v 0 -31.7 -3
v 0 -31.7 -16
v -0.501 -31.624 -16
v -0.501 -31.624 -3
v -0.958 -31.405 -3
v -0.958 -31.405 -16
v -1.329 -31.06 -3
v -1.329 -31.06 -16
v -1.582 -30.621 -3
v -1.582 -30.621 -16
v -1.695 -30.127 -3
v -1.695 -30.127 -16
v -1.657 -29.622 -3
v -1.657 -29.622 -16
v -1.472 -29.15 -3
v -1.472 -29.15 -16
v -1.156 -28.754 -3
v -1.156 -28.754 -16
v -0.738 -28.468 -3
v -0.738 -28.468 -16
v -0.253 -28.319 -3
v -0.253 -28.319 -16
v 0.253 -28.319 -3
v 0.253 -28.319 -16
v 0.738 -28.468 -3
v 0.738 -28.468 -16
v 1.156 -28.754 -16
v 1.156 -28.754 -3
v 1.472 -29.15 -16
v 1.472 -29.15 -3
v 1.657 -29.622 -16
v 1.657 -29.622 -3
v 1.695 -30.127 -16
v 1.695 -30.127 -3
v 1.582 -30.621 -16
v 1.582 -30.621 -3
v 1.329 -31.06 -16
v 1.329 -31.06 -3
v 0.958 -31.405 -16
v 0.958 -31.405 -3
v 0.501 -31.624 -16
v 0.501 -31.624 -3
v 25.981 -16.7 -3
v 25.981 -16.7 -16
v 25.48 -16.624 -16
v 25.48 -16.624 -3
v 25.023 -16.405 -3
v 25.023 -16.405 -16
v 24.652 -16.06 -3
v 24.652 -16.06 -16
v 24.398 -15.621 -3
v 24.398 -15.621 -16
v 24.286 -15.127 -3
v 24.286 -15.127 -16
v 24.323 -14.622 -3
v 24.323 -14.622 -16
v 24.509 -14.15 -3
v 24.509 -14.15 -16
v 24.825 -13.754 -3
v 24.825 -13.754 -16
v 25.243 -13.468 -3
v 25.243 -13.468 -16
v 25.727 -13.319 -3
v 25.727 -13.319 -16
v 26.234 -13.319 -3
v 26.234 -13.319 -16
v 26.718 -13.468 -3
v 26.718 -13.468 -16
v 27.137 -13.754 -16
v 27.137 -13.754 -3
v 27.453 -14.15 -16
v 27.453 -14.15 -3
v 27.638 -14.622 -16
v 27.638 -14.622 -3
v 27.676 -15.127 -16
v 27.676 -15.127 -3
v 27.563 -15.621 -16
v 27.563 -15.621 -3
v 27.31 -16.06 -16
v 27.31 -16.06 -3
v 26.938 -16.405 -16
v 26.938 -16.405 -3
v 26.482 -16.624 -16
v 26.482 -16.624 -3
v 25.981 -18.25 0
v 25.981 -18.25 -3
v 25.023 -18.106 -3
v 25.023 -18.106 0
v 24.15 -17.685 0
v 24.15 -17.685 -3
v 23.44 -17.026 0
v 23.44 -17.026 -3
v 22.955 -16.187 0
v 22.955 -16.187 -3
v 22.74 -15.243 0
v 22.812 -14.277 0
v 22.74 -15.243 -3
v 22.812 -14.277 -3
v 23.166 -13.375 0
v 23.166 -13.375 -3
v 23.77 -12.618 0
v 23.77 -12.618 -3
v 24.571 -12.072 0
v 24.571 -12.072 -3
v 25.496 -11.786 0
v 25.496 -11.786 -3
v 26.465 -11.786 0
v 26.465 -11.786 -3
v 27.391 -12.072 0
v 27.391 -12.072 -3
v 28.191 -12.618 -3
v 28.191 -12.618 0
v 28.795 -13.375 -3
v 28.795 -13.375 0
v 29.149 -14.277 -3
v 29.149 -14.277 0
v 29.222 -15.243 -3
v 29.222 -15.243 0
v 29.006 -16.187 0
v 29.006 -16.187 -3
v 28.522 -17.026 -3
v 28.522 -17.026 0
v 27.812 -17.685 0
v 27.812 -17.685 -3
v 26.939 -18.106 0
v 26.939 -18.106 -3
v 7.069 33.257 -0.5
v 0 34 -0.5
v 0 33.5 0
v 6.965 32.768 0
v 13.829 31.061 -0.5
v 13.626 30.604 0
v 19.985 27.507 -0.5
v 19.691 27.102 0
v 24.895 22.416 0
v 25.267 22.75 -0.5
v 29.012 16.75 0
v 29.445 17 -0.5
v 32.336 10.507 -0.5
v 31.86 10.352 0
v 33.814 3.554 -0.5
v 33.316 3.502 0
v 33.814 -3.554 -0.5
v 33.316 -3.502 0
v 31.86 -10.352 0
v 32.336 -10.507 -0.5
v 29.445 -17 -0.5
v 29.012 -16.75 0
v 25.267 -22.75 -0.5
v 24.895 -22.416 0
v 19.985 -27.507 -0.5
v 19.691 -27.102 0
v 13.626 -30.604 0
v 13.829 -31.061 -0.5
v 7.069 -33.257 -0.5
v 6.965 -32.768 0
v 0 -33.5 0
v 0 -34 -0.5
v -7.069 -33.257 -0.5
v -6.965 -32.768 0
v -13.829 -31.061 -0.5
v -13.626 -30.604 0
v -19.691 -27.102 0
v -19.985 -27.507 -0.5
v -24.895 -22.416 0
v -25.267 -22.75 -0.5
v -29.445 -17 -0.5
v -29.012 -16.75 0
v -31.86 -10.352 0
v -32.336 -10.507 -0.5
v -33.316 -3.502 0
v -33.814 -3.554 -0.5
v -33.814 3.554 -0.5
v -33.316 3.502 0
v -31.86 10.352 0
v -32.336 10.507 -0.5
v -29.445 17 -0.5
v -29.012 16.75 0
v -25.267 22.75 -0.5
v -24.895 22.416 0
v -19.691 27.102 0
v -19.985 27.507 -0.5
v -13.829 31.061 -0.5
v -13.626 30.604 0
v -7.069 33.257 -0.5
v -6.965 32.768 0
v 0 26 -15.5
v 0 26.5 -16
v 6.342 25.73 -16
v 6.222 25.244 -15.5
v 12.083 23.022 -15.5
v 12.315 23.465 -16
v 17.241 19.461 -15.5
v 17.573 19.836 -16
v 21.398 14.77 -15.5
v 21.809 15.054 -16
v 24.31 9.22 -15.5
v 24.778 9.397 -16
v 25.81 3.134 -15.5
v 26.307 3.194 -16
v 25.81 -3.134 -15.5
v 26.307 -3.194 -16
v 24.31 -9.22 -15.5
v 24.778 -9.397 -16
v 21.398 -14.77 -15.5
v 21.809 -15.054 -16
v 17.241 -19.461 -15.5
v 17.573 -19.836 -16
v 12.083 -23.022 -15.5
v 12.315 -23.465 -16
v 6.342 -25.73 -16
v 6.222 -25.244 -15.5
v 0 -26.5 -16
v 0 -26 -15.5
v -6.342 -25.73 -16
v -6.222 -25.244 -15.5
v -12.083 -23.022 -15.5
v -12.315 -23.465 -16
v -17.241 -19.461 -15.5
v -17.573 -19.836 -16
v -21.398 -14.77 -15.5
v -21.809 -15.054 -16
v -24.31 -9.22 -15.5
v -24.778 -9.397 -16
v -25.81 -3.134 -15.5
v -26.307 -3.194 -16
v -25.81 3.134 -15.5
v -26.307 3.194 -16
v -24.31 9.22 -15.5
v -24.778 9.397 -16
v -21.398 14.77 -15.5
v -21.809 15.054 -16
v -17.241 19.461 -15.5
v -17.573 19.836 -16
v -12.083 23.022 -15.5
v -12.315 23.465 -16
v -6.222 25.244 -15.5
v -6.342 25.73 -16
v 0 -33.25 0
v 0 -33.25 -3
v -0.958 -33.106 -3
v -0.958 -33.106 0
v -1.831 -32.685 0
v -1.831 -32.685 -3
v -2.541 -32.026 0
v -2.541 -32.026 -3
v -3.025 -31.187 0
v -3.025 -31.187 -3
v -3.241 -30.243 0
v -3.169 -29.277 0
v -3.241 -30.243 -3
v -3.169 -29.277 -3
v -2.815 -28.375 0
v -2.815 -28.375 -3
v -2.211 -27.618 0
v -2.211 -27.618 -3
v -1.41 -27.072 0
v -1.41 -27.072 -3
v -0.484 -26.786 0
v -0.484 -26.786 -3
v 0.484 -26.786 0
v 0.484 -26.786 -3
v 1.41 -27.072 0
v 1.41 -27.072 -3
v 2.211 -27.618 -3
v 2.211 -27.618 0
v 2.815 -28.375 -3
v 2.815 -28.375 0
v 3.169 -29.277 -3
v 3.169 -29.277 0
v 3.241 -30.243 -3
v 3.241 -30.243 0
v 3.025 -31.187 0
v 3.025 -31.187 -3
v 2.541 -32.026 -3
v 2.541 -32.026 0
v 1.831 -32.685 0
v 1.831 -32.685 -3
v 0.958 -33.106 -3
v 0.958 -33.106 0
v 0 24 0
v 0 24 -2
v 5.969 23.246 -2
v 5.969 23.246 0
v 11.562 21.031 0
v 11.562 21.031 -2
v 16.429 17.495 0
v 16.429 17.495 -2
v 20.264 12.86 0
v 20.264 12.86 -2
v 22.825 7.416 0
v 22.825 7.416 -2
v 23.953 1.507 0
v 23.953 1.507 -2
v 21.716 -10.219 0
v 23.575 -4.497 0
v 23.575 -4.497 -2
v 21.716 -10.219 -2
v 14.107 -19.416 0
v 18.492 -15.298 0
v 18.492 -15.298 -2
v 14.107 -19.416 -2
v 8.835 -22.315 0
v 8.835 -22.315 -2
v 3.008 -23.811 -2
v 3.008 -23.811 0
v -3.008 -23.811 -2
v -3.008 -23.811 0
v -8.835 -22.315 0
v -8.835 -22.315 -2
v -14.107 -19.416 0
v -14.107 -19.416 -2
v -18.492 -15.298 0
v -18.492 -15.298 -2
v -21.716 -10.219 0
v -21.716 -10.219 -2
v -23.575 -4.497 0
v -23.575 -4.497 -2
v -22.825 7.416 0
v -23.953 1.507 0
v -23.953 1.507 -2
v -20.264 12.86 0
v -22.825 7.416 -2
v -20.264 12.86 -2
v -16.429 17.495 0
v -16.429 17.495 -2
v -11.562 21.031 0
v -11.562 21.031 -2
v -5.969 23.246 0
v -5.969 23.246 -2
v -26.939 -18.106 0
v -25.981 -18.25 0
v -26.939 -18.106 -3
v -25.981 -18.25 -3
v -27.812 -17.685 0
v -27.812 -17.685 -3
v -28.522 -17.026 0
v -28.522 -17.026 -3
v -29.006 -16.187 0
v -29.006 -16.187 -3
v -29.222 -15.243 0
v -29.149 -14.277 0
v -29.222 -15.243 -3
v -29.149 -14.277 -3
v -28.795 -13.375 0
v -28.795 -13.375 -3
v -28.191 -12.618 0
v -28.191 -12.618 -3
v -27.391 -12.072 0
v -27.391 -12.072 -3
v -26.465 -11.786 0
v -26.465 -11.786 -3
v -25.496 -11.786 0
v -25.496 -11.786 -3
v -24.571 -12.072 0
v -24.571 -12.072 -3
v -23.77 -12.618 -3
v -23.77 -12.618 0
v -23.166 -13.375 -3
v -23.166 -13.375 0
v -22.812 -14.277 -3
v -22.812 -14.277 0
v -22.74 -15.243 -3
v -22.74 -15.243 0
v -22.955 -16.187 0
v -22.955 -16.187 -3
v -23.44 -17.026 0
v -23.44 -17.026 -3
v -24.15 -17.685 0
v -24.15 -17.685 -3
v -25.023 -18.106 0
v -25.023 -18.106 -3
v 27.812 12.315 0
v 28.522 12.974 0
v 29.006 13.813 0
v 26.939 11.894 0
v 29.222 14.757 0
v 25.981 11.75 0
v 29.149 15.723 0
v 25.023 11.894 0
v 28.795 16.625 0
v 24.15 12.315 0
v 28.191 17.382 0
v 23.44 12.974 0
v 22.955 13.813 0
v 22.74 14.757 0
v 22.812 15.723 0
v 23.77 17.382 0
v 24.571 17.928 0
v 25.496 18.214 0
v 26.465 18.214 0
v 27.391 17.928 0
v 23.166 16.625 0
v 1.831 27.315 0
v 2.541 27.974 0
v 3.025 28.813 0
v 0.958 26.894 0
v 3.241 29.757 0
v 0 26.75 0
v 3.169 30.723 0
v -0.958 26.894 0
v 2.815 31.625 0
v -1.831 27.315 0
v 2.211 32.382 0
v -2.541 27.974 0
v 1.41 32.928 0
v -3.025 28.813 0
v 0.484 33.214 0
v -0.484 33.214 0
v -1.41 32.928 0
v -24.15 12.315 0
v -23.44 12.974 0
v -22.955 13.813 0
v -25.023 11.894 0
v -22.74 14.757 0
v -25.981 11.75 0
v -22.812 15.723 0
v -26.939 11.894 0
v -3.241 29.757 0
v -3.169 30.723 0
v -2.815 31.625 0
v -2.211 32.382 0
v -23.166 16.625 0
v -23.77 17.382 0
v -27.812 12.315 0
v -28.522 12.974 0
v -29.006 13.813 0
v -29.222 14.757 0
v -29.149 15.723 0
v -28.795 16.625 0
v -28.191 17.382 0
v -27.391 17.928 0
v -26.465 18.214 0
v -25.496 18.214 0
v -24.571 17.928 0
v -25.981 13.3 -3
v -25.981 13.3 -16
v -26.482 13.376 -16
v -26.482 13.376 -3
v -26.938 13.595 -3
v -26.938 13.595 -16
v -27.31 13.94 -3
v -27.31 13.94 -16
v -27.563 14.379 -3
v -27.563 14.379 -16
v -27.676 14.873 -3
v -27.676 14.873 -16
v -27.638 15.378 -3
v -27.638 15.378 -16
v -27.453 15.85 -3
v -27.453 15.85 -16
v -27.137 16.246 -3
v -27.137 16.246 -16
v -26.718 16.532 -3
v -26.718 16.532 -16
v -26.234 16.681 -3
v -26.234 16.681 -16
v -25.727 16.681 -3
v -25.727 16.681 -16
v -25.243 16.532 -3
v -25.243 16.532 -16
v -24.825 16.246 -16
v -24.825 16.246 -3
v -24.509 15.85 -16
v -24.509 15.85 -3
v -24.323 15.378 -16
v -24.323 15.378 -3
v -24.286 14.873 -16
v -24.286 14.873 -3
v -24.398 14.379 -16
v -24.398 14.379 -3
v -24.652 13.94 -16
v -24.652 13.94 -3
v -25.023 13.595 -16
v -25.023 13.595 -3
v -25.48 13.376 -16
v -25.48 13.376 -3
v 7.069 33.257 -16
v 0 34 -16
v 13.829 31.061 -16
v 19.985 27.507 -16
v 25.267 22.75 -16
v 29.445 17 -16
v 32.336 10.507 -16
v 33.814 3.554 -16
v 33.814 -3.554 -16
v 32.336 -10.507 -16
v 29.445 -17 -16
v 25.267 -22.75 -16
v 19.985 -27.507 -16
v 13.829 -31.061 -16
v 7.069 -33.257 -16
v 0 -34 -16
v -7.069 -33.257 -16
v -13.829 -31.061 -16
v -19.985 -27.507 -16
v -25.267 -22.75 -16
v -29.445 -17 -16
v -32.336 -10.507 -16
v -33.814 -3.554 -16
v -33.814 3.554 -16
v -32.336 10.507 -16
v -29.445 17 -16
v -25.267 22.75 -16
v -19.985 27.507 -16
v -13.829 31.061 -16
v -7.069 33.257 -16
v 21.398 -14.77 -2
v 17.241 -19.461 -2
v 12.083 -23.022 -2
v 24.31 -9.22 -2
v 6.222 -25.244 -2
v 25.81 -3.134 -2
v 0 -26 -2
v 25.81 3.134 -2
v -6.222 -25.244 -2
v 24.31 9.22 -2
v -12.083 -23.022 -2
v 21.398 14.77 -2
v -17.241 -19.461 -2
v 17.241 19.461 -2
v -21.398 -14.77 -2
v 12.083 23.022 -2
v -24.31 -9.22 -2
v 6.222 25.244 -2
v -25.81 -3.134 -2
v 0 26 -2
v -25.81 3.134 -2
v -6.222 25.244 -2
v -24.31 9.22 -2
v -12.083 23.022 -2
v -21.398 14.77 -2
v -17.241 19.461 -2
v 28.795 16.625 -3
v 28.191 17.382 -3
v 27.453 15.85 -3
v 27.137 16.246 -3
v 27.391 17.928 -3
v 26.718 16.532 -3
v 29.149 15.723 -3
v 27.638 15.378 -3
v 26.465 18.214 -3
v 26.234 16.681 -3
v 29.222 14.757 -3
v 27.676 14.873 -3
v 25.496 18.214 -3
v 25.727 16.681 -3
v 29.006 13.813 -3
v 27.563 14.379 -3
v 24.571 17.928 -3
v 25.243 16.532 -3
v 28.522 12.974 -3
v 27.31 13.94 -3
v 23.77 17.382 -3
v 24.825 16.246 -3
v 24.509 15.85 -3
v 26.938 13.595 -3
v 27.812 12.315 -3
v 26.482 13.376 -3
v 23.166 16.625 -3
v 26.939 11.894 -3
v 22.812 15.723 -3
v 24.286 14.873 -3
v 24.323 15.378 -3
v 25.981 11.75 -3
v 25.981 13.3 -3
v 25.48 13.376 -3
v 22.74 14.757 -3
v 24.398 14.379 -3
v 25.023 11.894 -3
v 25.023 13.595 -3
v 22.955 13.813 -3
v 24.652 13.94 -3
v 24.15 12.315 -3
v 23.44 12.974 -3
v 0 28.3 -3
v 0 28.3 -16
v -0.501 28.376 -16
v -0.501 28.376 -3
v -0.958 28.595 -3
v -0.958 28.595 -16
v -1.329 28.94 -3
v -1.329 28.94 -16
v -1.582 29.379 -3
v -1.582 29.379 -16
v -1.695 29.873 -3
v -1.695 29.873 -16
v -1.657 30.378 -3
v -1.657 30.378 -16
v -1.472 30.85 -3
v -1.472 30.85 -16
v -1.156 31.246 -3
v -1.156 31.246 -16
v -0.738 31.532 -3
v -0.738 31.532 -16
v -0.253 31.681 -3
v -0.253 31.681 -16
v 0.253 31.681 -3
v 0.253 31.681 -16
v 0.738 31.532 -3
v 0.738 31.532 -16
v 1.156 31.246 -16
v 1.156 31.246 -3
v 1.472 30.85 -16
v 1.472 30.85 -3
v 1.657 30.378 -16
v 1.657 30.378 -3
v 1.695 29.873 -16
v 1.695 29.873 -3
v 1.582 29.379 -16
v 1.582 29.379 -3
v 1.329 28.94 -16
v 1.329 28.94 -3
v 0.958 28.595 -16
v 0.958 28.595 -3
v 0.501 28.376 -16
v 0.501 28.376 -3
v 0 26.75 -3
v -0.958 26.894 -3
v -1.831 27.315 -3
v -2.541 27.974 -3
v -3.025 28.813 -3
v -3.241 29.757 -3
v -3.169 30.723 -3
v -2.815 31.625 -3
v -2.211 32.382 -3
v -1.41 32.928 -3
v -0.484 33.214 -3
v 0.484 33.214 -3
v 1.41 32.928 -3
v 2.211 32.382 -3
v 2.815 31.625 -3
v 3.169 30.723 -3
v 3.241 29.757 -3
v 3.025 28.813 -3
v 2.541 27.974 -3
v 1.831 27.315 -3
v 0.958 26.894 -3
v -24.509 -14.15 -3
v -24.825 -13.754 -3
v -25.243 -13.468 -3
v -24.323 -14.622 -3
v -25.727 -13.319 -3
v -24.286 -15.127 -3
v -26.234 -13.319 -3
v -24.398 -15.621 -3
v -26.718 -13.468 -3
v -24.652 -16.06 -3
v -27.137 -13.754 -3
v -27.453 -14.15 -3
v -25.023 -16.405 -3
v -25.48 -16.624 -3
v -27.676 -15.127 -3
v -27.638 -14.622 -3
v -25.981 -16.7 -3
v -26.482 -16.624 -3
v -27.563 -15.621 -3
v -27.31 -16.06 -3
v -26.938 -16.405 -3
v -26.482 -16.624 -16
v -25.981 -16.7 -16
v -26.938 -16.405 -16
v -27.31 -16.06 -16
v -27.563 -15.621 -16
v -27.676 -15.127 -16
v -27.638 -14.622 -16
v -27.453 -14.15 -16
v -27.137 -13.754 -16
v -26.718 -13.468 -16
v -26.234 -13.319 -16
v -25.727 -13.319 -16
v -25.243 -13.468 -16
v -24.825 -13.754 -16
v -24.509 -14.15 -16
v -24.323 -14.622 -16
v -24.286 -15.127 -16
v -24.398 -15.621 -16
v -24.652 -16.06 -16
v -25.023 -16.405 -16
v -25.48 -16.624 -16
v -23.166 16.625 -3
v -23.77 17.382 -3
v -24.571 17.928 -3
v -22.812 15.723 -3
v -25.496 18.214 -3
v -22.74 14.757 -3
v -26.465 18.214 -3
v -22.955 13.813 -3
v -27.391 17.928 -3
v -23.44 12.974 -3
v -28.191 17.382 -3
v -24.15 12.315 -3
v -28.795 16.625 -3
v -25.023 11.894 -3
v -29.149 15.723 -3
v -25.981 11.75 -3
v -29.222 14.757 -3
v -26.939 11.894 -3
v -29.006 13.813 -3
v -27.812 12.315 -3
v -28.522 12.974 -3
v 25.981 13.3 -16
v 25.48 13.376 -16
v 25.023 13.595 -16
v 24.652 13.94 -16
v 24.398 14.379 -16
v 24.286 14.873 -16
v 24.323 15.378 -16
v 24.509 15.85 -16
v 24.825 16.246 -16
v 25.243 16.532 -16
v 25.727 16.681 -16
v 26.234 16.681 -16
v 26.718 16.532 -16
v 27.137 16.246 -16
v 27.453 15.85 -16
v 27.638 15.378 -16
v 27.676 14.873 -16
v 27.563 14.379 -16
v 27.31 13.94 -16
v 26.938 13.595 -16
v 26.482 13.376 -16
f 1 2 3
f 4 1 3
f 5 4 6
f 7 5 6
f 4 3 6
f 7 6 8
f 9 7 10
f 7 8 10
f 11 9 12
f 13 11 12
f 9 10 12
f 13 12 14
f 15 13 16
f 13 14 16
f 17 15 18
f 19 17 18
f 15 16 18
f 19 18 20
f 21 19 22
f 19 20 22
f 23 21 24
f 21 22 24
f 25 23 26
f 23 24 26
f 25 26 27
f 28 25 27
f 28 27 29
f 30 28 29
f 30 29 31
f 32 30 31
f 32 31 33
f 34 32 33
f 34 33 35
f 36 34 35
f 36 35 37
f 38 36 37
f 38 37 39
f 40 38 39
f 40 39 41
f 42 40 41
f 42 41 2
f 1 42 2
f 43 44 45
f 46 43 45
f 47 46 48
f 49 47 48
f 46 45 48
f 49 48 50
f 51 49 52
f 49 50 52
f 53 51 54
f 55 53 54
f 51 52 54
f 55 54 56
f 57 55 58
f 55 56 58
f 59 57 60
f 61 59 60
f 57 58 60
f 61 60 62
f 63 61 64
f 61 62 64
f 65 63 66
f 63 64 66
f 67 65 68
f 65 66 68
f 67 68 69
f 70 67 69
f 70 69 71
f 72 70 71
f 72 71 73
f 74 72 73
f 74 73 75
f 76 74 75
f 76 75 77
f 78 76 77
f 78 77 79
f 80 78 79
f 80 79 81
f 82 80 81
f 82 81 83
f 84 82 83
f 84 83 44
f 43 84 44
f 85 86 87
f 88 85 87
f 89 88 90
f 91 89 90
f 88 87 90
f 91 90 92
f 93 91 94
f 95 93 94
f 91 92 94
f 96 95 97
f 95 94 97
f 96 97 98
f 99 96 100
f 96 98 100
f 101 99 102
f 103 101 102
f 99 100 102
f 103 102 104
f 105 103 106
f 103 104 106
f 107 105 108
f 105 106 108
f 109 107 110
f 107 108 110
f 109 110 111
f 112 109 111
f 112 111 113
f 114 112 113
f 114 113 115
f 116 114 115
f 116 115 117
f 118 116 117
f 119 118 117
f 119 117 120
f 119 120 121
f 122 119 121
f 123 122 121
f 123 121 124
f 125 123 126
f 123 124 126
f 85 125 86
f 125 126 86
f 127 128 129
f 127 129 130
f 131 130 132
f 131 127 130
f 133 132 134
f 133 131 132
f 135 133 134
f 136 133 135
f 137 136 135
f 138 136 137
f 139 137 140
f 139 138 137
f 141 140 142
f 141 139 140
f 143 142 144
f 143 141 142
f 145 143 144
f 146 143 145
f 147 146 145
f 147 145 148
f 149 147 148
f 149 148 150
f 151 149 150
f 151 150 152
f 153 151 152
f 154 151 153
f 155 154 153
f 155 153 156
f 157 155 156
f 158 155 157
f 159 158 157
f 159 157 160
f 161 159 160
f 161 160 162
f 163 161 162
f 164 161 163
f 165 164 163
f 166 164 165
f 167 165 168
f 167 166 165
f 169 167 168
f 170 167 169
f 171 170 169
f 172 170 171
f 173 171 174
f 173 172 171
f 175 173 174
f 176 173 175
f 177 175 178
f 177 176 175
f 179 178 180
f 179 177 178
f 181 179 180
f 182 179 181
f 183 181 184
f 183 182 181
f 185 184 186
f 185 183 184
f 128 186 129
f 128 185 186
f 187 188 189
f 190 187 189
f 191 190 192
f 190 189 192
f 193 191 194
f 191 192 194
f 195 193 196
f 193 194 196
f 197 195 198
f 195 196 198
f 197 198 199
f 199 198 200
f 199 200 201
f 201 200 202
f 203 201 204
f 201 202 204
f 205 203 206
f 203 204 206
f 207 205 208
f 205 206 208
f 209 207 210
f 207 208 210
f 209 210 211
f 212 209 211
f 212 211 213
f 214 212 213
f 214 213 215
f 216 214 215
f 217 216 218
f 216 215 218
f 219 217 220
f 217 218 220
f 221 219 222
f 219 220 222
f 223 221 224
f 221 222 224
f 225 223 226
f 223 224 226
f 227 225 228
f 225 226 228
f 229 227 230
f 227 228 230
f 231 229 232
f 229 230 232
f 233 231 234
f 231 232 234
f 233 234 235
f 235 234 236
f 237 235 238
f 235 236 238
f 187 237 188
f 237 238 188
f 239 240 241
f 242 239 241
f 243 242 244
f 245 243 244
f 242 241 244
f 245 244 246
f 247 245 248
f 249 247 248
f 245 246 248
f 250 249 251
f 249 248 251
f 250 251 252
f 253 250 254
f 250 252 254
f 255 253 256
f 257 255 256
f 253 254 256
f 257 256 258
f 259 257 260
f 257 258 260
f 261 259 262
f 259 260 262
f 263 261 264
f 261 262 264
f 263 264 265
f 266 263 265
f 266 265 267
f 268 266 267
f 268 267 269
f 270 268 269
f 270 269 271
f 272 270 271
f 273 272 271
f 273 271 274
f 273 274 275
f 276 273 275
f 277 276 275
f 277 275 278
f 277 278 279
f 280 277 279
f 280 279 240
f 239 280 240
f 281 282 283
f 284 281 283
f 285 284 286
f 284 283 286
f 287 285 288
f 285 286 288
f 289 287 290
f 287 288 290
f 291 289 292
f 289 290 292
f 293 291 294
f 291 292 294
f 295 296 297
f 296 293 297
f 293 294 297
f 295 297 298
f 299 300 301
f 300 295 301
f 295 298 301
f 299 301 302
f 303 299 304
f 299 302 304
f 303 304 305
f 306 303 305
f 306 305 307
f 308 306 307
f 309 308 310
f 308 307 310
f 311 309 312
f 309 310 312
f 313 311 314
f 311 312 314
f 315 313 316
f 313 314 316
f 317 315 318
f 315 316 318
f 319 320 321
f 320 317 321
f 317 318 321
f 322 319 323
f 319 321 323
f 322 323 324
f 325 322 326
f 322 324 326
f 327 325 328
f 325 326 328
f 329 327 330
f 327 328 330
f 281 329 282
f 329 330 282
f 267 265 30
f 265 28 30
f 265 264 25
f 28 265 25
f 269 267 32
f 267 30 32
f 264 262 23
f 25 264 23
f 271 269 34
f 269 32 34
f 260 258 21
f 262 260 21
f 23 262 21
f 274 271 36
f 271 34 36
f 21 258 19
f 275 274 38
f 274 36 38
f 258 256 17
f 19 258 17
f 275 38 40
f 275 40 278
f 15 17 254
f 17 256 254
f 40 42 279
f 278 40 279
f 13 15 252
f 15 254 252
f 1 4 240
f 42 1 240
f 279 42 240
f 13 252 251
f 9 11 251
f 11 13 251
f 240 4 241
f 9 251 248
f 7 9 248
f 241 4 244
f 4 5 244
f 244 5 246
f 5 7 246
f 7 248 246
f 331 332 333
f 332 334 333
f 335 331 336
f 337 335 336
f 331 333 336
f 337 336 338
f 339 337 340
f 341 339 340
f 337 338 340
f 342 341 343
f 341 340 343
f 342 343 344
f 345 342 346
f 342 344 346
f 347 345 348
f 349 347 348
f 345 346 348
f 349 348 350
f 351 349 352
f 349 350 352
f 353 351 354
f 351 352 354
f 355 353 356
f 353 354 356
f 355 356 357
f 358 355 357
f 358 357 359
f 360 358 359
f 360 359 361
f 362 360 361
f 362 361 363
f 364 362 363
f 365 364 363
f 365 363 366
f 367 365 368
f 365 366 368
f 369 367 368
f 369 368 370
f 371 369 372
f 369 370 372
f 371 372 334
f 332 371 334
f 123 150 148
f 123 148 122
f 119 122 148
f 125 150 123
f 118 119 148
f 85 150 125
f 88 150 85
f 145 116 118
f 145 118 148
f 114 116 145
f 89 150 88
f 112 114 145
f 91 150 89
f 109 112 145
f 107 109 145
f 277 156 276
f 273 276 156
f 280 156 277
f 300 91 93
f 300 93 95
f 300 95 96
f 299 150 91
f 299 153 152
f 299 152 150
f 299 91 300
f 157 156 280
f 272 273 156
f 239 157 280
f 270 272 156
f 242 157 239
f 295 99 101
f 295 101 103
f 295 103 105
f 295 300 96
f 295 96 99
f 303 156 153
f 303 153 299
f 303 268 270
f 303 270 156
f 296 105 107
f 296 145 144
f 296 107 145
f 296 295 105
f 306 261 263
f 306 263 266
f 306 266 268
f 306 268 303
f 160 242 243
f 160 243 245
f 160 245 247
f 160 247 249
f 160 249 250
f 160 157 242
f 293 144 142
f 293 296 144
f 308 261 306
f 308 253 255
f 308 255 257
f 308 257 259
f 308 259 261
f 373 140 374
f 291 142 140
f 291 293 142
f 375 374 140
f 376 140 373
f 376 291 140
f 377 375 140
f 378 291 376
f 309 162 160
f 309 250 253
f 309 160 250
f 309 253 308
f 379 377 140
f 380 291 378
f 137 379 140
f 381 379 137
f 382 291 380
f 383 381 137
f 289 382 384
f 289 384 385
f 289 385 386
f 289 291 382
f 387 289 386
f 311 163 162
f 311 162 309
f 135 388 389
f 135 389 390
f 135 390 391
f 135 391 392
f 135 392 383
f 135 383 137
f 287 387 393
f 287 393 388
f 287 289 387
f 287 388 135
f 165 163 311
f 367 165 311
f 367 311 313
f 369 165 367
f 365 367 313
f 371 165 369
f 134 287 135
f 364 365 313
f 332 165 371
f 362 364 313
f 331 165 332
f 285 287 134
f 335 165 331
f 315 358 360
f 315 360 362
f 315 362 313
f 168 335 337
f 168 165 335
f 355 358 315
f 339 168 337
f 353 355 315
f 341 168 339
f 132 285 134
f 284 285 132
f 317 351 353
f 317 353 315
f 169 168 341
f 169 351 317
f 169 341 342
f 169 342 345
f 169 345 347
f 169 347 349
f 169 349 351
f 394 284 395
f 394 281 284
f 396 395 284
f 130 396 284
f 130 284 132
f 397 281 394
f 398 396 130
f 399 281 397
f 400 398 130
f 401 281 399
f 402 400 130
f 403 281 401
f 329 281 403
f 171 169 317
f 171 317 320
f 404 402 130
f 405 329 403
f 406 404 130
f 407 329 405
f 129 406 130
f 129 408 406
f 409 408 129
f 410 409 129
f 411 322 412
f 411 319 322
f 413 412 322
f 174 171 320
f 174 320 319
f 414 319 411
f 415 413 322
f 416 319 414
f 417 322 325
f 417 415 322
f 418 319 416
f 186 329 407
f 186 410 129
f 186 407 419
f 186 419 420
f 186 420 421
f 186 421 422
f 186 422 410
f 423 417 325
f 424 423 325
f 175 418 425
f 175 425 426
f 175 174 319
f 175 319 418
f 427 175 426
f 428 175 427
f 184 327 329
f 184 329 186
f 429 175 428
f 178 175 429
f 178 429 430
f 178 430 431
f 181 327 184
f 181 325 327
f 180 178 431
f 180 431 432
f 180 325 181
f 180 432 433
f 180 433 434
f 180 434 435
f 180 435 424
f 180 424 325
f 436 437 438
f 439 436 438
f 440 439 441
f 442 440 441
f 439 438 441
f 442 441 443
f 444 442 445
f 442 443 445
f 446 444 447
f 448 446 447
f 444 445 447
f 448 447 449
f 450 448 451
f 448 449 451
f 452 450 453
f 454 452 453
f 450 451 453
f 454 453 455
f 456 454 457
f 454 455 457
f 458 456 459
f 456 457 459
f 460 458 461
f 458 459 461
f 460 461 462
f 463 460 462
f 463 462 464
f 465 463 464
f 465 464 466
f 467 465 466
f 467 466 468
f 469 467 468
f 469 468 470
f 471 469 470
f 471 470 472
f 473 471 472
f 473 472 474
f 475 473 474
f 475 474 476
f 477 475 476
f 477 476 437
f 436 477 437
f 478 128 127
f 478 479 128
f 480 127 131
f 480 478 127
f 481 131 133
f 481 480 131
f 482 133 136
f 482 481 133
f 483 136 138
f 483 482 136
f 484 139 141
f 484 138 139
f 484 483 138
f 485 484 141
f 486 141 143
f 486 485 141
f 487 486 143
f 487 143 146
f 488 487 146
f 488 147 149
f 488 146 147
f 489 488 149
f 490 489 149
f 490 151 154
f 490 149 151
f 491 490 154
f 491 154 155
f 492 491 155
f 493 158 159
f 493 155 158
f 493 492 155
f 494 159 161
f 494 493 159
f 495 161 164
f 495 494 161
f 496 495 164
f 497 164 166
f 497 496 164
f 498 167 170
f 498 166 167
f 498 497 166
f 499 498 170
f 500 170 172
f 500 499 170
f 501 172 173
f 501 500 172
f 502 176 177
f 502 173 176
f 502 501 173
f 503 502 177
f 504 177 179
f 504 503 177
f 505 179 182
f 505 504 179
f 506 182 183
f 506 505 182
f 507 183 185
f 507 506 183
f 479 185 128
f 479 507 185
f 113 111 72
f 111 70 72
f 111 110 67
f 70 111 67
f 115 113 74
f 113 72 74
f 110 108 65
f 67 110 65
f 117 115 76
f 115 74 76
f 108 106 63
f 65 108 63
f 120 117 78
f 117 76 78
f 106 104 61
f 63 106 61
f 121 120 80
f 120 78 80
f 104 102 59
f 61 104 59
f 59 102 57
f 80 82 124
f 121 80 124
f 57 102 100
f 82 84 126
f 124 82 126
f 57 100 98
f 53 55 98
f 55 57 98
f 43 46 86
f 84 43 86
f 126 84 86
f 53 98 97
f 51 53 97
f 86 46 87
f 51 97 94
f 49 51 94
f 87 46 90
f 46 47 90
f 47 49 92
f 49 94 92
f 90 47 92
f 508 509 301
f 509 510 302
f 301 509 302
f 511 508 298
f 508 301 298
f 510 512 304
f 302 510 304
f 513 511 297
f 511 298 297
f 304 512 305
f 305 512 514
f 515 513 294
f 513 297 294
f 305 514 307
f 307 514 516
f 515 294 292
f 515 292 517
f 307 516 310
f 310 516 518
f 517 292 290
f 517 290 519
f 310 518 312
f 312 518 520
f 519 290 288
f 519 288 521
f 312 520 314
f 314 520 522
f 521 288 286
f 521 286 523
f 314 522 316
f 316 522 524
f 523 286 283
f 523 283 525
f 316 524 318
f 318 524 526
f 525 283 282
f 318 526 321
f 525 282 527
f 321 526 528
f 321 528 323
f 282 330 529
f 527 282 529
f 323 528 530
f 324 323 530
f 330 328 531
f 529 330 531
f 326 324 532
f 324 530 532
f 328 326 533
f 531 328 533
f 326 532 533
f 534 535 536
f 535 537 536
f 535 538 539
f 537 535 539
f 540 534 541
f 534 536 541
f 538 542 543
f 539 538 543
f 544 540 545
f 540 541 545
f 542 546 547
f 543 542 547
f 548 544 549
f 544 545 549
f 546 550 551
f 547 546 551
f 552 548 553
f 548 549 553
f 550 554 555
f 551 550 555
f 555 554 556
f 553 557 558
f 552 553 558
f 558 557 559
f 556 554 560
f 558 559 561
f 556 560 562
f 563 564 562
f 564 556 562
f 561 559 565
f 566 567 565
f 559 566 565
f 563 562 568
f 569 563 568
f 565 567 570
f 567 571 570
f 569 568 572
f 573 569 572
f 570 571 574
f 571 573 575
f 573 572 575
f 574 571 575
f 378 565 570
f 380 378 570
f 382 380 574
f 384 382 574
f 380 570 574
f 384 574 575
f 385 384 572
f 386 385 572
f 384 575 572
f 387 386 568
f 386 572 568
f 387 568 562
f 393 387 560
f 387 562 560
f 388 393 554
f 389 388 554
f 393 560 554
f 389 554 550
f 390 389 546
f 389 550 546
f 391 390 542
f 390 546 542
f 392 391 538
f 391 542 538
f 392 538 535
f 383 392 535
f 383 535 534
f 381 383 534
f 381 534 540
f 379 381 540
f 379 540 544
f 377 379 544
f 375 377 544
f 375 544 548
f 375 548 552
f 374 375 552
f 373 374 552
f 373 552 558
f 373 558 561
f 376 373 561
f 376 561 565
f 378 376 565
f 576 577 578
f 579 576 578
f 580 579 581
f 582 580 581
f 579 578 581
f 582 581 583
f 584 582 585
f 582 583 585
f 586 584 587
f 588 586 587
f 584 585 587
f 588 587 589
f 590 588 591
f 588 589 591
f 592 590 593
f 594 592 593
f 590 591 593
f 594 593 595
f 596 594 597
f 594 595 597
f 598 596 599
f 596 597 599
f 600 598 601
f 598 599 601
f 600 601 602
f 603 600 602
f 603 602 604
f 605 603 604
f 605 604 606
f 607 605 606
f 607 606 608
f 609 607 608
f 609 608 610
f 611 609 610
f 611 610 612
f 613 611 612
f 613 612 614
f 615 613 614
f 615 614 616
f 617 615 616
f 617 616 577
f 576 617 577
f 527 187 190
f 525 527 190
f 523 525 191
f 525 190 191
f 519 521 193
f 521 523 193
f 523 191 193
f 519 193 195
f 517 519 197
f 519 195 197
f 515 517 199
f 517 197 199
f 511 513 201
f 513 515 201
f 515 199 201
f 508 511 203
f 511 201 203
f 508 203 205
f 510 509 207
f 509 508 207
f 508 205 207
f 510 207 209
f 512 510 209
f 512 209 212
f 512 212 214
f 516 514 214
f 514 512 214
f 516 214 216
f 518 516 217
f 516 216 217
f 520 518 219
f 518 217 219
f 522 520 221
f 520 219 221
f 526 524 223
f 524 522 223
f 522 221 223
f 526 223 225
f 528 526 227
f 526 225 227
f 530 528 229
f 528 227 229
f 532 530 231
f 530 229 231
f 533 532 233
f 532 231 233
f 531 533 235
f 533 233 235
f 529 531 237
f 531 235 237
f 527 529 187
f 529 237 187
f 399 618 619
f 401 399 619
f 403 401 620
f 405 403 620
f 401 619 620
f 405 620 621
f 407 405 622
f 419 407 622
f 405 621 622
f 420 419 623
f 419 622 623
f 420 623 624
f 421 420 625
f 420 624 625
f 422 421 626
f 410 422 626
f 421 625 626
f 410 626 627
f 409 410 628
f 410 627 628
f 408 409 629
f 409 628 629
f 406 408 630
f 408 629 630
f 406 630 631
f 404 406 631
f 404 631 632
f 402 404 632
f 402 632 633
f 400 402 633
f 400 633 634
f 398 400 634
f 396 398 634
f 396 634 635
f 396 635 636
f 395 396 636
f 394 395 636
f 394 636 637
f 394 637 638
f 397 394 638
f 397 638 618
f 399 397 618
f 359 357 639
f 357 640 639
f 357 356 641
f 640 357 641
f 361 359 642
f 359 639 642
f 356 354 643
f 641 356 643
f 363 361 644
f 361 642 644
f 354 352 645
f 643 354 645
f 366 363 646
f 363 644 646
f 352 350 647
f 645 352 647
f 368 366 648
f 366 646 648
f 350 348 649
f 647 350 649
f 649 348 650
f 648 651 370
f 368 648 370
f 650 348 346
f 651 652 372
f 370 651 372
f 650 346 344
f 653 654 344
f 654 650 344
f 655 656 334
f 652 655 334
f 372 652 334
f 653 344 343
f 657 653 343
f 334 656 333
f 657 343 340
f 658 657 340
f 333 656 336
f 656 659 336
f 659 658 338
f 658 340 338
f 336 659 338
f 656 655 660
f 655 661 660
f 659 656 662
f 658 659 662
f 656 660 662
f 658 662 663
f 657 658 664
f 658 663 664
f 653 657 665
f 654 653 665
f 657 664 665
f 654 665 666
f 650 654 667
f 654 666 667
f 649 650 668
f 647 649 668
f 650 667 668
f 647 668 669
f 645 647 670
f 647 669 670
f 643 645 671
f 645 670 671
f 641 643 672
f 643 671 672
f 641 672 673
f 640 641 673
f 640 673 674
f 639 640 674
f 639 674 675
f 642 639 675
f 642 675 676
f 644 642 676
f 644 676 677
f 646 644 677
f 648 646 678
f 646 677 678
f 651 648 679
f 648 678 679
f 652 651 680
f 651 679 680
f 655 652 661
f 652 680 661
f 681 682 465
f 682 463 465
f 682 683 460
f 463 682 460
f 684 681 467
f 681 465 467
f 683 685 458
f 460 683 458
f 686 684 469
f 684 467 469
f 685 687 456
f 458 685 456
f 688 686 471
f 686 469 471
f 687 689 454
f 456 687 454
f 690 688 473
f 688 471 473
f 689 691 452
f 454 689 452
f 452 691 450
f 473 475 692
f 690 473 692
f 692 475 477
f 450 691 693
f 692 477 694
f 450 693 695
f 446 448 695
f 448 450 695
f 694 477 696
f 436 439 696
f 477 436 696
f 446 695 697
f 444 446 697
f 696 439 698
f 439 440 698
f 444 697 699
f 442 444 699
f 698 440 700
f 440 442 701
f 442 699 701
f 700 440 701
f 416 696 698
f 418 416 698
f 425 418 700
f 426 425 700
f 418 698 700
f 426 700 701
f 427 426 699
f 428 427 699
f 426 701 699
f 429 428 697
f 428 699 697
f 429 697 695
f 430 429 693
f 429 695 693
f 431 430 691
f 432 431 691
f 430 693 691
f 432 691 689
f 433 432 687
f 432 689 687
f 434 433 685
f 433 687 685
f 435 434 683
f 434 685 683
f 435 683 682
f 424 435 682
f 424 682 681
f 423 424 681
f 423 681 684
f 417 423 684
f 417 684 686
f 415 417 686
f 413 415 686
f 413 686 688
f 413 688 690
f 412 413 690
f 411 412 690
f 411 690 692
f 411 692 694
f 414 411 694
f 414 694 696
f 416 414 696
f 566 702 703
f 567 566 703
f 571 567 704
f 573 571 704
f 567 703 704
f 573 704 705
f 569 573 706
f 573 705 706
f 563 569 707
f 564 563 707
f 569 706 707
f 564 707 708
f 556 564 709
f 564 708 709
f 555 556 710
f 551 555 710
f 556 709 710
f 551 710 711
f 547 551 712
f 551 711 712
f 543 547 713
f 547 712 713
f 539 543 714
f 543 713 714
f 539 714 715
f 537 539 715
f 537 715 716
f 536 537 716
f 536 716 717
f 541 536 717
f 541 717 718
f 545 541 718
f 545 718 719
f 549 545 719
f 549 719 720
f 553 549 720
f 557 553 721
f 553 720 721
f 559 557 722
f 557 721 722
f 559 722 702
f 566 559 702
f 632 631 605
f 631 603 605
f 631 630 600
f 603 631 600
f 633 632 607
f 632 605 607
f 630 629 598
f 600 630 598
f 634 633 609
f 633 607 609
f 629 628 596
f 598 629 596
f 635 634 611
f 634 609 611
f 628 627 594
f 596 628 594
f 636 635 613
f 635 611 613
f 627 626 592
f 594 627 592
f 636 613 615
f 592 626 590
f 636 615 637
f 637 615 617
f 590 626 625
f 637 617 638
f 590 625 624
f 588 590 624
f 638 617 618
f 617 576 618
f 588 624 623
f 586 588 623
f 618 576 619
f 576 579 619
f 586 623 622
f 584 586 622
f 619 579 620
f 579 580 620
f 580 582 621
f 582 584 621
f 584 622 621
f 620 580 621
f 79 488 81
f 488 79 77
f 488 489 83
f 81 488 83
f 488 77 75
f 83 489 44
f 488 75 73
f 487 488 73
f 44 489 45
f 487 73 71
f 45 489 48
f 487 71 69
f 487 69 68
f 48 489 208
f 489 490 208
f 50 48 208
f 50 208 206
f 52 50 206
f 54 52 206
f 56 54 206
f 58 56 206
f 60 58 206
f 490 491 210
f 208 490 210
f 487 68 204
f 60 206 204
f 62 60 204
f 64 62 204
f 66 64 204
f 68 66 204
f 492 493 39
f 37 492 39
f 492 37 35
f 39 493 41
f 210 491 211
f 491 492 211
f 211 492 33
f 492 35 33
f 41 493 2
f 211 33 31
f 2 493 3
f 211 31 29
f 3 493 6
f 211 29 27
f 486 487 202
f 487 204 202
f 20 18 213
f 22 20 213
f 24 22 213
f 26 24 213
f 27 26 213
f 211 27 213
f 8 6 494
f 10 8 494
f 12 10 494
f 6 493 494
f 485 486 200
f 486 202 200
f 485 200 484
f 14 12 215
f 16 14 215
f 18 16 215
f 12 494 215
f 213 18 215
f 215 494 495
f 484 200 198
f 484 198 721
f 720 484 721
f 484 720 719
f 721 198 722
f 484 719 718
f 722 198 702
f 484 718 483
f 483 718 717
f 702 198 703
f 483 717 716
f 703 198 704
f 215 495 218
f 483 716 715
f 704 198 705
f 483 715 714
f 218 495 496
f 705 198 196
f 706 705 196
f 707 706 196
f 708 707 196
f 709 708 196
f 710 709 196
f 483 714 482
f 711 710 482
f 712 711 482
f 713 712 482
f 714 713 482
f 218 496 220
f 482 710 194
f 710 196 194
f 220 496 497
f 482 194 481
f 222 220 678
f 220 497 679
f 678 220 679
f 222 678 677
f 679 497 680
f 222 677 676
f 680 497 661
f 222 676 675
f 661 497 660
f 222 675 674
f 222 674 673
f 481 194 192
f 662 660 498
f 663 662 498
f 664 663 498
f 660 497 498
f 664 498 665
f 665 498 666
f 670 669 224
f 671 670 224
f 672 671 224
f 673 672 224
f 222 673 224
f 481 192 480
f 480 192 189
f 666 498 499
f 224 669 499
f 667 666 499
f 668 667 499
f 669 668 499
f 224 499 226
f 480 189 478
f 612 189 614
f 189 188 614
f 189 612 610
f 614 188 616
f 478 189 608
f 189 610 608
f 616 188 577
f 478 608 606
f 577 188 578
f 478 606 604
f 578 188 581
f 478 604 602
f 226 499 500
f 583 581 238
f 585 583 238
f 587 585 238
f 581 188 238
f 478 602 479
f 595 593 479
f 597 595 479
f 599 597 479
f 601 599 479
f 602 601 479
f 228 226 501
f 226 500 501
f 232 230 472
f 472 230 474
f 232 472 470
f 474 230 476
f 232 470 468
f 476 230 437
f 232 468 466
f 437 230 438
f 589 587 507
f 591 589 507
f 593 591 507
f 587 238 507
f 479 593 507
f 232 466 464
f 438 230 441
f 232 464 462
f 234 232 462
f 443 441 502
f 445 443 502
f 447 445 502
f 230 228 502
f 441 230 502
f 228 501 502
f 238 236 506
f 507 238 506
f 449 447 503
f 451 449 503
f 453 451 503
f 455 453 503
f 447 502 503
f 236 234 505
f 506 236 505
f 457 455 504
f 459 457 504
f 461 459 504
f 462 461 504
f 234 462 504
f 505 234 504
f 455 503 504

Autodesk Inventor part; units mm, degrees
ref_plane "YZ Plane" through (0, 0, 0) normal (1, 0, 0) x (0, 1, 0)
ref_plane "XZ Plane" through (0, 0, 0) normal (0, 1, 0) x (-1, 0, 0)
ref_plane "XY Plane" through (0, 0, 0) normal (0, 0, 1) x (1, 0, 0)
sketch "スケッチ2" plane through (0, 0, 0) normal (1, 0, 0) x (0, 1, 0)
  line L0 (0, 0) -> (26, 0)
  line L1 (26, 0) -> (26, -16)
  line L2 (26, -16) -> (0, -16)
  line L3 (0, -16) -> (0, 0)
  line L4 (0, 0) -> (34, 0)
  line L5 (34, 0) -> (34, -16)
  line L6 (34, -16) -> (0, -16)
  line L7 (0, -16) -> (0, 0)
  line L8 (34, 0) -> (21, 0)
  line L9 (26, 0) -> (24, 0)
  line L10 (24, 0) -> (24, -2)
  line L11 (24, -2) -> (26, -2)
  line L12 (26, -2) -> (26, 0)
  point P0 (26, 0)
  point P1 (26, -16)
  point P2 (26, -2)
  point P3 (24, 0)
  dimension "d1" = 26
  dimension "d8" = 2
  dimension "d10" = 14
  dimension "d27" = 8
  dimension "d31" = 2
revolve "回転1" add sketch "スケッチ2" angle 360 about axis through (0, 0, -16) along (0, 0, 1) contours L0 L1 L11 L10 | L1 L4 L5 L6
sketch "スケッチ4" plane through (0, 0, 0) normal (0, 0, 1) x (1, 0, 0)
  point P0 (0, 0)
  point P1 (0, 30)
  point P2 (-25.9808, 15)
  point P3 (-25.9808, -15)
  point P4 (0, -30)
  point P5 (25.9808, -15)
  point P6 (25.9808, 15)
  dimension "d11" = 30
  dimension "d14" = 360
hole "穴1" at (0, 30, 0) at (-25.9808, 15, 0) at (-25.9808, -15, 0) at (0, -30, 0) at (25.9808, -15, 0) at (25.9808, 15, 0) direction (0, 0, -1) diameter 3.4 end through all counterbore diameter 6.5 counterbore depth 3 clearance for "Socket Head Cap Screw" size "M3" standard "Ansi Metric M Profile"
chamfer "面取り1" distance 0.5 angle 45 1 edges at (0, -26, -16)
chamfer "面取り2" distance 0.5 angle 45 1 edges at (0, -34, 0)
properties part number "bearing_cover_j5" material "ABS プラスチック"
